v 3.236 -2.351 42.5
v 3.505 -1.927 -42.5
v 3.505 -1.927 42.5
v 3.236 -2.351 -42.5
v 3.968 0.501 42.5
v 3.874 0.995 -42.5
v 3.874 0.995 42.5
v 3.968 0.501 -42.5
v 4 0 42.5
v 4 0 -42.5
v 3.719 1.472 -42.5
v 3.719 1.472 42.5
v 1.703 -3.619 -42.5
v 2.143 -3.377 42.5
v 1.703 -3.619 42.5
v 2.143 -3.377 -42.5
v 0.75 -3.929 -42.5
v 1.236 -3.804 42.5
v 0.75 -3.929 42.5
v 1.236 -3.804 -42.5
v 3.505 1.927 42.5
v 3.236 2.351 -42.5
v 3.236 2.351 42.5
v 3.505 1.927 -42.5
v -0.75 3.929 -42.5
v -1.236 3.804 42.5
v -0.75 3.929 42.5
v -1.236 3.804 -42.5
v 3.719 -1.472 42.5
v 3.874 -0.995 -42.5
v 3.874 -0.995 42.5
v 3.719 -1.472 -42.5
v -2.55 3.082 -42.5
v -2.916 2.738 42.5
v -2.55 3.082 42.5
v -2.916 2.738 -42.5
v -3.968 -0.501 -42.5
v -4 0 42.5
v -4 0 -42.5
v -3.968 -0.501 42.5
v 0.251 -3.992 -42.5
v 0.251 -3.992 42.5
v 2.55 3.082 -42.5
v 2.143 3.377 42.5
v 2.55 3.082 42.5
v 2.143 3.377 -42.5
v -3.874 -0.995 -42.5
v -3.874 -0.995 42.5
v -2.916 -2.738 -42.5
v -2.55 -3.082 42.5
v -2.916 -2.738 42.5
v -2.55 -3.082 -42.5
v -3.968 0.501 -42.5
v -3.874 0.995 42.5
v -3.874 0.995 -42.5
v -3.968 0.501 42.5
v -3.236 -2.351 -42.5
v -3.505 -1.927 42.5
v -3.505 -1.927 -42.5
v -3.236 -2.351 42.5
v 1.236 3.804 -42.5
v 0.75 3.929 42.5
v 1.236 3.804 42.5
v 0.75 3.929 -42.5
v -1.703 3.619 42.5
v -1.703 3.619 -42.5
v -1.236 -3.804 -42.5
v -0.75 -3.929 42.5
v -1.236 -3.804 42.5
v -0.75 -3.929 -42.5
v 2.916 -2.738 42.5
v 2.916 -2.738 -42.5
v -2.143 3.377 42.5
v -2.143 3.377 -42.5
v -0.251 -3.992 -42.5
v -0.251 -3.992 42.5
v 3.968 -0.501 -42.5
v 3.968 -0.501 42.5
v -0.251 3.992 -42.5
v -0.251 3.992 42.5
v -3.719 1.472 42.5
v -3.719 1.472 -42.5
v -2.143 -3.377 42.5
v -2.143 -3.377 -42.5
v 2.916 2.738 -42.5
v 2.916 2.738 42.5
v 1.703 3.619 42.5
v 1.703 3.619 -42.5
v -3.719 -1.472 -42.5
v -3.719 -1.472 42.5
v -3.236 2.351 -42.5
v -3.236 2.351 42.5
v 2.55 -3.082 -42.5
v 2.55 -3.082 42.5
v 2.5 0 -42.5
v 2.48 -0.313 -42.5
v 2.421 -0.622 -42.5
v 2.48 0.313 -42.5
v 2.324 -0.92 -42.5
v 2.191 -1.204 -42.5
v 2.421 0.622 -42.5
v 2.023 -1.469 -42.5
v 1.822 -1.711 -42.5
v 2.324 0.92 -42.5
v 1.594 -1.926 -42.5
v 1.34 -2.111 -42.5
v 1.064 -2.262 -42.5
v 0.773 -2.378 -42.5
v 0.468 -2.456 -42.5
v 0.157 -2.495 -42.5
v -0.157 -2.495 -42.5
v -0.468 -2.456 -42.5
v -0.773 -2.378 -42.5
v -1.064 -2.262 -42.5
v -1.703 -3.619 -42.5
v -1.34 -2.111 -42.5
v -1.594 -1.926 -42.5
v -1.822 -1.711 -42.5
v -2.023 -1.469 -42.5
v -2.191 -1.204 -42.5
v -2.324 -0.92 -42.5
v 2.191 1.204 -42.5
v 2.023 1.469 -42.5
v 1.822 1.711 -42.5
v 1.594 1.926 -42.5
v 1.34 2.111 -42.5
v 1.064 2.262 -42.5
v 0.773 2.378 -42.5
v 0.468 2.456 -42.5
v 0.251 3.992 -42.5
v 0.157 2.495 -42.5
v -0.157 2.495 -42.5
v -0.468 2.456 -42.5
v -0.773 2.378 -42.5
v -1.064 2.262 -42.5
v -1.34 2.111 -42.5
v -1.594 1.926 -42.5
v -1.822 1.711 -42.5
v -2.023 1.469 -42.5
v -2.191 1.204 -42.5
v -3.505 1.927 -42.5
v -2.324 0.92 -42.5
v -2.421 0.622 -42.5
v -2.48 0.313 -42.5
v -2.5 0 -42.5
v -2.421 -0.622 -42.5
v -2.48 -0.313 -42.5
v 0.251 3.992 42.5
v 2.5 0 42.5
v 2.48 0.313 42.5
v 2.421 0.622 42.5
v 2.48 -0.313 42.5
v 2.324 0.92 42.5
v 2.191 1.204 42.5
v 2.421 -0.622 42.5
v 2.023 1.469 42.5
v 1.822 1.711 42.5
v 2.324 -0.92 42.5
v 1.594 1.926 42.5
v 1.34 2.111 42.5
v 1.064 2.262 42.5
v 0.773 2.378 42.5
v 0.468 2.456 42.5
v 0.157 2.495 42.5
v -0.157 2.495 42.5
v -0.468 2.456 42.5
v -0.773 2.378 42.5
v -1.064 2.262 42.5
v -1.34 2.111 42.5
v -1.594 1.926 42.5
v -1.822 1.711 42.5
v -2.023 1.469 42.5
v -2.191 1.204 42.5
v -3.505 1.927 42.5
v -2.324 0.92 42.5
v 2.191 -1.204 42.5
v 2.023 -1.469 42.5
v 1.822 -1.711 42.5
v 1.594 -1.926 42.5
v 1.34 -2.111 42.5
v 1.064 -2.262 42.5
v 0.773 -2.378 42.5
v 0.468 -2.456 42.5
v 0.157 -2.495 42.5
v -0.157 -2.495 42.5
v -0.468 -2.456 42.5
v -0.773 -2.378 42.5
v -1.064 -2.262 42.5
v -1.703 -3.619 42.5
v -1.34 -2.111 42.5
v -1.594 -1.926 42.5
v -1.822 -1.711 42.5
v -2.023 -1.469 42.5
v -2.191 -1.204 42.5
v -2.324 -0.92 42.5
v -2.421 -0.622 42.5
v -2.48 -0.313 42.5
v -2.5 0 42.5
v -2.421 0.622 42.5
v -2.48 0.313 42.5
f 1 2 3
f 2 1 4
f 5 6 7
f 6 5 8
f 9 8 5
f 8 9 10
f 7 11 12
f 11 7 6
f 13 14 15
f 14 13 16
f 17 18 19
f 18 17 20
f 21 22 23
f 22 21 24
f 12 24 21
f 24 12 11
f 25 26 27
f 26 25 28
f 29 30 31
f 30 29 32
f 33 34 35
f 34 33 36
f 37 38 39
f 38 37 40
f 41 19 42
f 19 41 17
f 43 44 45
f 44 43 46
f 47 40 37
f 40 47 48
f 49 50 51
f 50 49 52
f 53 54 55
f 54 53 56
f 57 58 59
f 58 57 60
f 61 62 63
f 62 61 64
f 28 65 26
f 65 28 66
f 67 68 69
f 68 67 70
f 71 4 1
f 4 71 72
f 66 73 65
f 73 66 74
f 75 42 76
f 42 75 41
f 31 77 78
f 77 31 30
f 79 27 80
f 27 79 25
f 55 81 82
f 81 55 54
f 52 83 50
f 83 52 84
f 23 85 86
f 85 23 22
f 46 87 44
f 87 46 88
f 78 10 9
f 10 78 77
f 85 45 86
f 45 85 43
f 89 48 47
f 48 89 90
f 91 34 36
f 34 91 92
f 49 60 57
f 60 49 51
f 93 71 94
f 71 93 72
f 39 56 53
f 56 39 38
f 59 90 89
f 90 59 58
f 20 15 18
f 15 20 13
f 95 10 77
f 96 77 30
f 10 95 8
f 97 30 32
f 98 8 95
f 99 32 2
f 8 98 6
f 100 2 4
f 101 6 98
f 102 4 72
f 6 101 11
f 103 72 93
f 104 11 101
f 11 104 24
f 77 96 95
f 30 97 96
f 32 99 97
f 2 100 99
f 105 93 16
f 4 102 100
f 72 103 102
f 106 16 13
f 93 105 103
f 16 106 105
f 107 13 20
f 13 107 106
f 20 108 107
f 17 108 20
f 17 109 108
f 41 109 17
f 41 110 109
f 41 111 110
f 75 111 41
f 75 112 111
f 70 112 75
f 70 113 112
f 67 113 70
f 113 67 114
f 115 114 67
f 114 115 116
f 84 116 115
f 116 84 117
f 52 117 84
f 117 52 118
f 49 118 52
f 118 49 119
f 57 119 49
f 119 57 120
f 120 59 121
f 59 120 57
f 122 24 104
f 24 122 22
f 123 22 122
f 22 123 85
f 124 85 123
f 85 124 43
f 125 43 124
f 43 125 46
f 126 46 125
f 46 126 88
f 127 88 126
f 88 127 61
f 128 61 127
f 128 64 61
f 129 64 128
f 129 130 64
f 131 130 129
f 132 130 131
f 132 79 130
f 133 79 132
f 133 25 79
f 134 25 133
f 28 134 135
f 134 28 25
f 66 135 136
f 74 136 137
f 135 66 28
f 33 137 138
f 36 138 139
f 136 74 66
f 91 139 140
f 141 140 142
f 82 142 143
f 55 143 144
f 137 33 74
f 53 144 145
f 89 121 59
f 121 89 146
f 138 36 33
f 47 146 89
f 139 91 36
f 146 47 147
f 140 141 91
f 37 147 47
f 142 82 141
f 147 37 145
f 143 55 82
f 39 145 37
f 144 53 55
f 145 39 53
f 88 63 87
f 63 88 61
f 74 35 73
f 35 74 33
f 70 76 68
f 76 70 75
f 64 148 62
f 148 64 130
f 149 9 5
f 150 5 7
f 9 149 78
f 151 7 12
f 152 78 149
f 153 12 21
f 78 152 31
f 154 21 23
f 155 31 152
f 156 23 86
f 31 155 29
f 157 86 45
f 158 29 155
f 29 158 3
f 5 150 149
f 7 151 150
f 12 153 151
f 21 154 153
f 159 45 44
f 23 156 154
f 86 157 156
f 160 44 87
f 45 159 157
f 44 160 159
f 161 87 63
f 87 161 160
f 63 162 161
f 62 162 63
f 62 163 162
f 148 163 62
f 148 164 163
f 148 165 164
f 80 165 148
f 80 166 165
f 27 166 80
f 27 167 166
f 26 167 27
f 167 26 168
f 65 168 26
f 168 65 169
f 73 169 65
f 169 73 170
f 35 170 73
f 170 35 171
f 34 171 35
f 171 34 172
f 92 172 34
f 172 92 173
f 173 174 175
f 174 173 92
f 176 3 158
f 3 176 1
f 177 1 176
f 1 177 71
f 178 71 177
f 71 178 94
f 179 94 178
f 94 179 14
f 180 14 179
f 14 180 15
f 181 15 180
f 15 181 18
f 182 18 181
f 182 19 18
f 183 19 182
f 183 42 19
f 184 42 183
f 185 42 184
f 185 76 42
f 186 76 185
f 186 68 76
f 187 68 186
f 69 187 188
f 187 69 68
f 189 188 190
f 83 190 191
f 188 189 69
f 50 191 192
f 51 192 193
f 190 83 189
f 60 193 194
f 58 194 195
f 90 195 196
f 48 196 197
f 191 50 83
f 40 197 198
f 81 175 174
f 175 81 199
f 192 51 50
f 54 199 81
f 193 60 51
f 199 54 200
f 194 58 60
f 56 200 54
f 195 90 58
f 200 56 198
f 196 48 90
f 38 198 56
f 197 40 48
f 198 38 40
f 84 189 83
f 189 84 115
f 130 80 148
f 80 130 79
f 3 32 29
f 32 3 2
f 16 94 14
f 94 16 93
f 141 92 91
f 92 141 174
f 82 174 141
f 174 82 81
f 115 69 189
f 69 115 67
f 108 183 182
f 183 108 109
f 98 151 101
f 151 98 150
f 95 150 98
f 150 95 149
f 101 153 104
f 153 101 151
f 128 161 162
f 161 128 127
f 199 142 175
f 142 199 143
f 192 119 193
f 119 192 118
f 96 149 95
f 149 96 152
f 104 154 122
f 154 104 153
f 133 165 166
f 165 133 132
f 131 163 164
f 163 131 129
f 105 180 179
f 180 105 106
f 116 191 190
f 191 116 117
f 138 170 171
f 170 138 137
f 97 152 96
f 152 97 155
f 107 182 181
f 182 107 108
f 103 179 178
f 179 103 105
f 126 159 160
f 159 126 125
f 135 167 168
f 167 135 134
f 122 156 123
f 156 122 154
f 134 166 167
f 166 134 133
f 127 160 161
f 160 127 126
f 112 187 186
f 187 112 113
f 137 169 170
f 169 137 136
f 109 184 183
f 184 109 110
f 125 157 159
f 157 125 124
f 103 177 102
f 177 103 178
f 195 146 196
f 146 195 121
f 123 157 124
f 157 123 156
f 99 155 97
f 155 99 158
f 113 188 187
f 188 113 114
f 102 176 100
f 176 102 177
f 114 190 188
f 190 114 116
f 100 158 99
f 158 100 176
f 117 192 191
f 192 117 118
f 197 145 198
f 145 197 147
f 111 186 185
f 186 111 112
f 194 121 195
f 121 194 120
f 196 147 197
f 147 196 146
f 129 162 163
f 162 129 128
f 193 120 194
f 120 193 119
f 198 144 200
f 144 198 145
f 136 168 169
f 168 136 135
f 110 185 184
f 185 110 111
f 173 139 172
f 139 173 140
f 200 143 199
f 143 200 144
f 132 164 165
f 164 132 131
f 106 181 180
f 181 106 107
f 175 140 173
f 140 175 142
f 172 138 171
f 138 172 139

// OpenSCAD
$fn = 50;


difference() {
	union() {
		translate(v = [0, 0, -42.5000000000]) {
			cylinder(h = 85, r = 4.0000000000);
		}
	}
	union() {
		translate(v = [0, 0, -100.0000000000]) {
			cylinder(h = 200, r = 2.5000000000);
		}
	}
}
